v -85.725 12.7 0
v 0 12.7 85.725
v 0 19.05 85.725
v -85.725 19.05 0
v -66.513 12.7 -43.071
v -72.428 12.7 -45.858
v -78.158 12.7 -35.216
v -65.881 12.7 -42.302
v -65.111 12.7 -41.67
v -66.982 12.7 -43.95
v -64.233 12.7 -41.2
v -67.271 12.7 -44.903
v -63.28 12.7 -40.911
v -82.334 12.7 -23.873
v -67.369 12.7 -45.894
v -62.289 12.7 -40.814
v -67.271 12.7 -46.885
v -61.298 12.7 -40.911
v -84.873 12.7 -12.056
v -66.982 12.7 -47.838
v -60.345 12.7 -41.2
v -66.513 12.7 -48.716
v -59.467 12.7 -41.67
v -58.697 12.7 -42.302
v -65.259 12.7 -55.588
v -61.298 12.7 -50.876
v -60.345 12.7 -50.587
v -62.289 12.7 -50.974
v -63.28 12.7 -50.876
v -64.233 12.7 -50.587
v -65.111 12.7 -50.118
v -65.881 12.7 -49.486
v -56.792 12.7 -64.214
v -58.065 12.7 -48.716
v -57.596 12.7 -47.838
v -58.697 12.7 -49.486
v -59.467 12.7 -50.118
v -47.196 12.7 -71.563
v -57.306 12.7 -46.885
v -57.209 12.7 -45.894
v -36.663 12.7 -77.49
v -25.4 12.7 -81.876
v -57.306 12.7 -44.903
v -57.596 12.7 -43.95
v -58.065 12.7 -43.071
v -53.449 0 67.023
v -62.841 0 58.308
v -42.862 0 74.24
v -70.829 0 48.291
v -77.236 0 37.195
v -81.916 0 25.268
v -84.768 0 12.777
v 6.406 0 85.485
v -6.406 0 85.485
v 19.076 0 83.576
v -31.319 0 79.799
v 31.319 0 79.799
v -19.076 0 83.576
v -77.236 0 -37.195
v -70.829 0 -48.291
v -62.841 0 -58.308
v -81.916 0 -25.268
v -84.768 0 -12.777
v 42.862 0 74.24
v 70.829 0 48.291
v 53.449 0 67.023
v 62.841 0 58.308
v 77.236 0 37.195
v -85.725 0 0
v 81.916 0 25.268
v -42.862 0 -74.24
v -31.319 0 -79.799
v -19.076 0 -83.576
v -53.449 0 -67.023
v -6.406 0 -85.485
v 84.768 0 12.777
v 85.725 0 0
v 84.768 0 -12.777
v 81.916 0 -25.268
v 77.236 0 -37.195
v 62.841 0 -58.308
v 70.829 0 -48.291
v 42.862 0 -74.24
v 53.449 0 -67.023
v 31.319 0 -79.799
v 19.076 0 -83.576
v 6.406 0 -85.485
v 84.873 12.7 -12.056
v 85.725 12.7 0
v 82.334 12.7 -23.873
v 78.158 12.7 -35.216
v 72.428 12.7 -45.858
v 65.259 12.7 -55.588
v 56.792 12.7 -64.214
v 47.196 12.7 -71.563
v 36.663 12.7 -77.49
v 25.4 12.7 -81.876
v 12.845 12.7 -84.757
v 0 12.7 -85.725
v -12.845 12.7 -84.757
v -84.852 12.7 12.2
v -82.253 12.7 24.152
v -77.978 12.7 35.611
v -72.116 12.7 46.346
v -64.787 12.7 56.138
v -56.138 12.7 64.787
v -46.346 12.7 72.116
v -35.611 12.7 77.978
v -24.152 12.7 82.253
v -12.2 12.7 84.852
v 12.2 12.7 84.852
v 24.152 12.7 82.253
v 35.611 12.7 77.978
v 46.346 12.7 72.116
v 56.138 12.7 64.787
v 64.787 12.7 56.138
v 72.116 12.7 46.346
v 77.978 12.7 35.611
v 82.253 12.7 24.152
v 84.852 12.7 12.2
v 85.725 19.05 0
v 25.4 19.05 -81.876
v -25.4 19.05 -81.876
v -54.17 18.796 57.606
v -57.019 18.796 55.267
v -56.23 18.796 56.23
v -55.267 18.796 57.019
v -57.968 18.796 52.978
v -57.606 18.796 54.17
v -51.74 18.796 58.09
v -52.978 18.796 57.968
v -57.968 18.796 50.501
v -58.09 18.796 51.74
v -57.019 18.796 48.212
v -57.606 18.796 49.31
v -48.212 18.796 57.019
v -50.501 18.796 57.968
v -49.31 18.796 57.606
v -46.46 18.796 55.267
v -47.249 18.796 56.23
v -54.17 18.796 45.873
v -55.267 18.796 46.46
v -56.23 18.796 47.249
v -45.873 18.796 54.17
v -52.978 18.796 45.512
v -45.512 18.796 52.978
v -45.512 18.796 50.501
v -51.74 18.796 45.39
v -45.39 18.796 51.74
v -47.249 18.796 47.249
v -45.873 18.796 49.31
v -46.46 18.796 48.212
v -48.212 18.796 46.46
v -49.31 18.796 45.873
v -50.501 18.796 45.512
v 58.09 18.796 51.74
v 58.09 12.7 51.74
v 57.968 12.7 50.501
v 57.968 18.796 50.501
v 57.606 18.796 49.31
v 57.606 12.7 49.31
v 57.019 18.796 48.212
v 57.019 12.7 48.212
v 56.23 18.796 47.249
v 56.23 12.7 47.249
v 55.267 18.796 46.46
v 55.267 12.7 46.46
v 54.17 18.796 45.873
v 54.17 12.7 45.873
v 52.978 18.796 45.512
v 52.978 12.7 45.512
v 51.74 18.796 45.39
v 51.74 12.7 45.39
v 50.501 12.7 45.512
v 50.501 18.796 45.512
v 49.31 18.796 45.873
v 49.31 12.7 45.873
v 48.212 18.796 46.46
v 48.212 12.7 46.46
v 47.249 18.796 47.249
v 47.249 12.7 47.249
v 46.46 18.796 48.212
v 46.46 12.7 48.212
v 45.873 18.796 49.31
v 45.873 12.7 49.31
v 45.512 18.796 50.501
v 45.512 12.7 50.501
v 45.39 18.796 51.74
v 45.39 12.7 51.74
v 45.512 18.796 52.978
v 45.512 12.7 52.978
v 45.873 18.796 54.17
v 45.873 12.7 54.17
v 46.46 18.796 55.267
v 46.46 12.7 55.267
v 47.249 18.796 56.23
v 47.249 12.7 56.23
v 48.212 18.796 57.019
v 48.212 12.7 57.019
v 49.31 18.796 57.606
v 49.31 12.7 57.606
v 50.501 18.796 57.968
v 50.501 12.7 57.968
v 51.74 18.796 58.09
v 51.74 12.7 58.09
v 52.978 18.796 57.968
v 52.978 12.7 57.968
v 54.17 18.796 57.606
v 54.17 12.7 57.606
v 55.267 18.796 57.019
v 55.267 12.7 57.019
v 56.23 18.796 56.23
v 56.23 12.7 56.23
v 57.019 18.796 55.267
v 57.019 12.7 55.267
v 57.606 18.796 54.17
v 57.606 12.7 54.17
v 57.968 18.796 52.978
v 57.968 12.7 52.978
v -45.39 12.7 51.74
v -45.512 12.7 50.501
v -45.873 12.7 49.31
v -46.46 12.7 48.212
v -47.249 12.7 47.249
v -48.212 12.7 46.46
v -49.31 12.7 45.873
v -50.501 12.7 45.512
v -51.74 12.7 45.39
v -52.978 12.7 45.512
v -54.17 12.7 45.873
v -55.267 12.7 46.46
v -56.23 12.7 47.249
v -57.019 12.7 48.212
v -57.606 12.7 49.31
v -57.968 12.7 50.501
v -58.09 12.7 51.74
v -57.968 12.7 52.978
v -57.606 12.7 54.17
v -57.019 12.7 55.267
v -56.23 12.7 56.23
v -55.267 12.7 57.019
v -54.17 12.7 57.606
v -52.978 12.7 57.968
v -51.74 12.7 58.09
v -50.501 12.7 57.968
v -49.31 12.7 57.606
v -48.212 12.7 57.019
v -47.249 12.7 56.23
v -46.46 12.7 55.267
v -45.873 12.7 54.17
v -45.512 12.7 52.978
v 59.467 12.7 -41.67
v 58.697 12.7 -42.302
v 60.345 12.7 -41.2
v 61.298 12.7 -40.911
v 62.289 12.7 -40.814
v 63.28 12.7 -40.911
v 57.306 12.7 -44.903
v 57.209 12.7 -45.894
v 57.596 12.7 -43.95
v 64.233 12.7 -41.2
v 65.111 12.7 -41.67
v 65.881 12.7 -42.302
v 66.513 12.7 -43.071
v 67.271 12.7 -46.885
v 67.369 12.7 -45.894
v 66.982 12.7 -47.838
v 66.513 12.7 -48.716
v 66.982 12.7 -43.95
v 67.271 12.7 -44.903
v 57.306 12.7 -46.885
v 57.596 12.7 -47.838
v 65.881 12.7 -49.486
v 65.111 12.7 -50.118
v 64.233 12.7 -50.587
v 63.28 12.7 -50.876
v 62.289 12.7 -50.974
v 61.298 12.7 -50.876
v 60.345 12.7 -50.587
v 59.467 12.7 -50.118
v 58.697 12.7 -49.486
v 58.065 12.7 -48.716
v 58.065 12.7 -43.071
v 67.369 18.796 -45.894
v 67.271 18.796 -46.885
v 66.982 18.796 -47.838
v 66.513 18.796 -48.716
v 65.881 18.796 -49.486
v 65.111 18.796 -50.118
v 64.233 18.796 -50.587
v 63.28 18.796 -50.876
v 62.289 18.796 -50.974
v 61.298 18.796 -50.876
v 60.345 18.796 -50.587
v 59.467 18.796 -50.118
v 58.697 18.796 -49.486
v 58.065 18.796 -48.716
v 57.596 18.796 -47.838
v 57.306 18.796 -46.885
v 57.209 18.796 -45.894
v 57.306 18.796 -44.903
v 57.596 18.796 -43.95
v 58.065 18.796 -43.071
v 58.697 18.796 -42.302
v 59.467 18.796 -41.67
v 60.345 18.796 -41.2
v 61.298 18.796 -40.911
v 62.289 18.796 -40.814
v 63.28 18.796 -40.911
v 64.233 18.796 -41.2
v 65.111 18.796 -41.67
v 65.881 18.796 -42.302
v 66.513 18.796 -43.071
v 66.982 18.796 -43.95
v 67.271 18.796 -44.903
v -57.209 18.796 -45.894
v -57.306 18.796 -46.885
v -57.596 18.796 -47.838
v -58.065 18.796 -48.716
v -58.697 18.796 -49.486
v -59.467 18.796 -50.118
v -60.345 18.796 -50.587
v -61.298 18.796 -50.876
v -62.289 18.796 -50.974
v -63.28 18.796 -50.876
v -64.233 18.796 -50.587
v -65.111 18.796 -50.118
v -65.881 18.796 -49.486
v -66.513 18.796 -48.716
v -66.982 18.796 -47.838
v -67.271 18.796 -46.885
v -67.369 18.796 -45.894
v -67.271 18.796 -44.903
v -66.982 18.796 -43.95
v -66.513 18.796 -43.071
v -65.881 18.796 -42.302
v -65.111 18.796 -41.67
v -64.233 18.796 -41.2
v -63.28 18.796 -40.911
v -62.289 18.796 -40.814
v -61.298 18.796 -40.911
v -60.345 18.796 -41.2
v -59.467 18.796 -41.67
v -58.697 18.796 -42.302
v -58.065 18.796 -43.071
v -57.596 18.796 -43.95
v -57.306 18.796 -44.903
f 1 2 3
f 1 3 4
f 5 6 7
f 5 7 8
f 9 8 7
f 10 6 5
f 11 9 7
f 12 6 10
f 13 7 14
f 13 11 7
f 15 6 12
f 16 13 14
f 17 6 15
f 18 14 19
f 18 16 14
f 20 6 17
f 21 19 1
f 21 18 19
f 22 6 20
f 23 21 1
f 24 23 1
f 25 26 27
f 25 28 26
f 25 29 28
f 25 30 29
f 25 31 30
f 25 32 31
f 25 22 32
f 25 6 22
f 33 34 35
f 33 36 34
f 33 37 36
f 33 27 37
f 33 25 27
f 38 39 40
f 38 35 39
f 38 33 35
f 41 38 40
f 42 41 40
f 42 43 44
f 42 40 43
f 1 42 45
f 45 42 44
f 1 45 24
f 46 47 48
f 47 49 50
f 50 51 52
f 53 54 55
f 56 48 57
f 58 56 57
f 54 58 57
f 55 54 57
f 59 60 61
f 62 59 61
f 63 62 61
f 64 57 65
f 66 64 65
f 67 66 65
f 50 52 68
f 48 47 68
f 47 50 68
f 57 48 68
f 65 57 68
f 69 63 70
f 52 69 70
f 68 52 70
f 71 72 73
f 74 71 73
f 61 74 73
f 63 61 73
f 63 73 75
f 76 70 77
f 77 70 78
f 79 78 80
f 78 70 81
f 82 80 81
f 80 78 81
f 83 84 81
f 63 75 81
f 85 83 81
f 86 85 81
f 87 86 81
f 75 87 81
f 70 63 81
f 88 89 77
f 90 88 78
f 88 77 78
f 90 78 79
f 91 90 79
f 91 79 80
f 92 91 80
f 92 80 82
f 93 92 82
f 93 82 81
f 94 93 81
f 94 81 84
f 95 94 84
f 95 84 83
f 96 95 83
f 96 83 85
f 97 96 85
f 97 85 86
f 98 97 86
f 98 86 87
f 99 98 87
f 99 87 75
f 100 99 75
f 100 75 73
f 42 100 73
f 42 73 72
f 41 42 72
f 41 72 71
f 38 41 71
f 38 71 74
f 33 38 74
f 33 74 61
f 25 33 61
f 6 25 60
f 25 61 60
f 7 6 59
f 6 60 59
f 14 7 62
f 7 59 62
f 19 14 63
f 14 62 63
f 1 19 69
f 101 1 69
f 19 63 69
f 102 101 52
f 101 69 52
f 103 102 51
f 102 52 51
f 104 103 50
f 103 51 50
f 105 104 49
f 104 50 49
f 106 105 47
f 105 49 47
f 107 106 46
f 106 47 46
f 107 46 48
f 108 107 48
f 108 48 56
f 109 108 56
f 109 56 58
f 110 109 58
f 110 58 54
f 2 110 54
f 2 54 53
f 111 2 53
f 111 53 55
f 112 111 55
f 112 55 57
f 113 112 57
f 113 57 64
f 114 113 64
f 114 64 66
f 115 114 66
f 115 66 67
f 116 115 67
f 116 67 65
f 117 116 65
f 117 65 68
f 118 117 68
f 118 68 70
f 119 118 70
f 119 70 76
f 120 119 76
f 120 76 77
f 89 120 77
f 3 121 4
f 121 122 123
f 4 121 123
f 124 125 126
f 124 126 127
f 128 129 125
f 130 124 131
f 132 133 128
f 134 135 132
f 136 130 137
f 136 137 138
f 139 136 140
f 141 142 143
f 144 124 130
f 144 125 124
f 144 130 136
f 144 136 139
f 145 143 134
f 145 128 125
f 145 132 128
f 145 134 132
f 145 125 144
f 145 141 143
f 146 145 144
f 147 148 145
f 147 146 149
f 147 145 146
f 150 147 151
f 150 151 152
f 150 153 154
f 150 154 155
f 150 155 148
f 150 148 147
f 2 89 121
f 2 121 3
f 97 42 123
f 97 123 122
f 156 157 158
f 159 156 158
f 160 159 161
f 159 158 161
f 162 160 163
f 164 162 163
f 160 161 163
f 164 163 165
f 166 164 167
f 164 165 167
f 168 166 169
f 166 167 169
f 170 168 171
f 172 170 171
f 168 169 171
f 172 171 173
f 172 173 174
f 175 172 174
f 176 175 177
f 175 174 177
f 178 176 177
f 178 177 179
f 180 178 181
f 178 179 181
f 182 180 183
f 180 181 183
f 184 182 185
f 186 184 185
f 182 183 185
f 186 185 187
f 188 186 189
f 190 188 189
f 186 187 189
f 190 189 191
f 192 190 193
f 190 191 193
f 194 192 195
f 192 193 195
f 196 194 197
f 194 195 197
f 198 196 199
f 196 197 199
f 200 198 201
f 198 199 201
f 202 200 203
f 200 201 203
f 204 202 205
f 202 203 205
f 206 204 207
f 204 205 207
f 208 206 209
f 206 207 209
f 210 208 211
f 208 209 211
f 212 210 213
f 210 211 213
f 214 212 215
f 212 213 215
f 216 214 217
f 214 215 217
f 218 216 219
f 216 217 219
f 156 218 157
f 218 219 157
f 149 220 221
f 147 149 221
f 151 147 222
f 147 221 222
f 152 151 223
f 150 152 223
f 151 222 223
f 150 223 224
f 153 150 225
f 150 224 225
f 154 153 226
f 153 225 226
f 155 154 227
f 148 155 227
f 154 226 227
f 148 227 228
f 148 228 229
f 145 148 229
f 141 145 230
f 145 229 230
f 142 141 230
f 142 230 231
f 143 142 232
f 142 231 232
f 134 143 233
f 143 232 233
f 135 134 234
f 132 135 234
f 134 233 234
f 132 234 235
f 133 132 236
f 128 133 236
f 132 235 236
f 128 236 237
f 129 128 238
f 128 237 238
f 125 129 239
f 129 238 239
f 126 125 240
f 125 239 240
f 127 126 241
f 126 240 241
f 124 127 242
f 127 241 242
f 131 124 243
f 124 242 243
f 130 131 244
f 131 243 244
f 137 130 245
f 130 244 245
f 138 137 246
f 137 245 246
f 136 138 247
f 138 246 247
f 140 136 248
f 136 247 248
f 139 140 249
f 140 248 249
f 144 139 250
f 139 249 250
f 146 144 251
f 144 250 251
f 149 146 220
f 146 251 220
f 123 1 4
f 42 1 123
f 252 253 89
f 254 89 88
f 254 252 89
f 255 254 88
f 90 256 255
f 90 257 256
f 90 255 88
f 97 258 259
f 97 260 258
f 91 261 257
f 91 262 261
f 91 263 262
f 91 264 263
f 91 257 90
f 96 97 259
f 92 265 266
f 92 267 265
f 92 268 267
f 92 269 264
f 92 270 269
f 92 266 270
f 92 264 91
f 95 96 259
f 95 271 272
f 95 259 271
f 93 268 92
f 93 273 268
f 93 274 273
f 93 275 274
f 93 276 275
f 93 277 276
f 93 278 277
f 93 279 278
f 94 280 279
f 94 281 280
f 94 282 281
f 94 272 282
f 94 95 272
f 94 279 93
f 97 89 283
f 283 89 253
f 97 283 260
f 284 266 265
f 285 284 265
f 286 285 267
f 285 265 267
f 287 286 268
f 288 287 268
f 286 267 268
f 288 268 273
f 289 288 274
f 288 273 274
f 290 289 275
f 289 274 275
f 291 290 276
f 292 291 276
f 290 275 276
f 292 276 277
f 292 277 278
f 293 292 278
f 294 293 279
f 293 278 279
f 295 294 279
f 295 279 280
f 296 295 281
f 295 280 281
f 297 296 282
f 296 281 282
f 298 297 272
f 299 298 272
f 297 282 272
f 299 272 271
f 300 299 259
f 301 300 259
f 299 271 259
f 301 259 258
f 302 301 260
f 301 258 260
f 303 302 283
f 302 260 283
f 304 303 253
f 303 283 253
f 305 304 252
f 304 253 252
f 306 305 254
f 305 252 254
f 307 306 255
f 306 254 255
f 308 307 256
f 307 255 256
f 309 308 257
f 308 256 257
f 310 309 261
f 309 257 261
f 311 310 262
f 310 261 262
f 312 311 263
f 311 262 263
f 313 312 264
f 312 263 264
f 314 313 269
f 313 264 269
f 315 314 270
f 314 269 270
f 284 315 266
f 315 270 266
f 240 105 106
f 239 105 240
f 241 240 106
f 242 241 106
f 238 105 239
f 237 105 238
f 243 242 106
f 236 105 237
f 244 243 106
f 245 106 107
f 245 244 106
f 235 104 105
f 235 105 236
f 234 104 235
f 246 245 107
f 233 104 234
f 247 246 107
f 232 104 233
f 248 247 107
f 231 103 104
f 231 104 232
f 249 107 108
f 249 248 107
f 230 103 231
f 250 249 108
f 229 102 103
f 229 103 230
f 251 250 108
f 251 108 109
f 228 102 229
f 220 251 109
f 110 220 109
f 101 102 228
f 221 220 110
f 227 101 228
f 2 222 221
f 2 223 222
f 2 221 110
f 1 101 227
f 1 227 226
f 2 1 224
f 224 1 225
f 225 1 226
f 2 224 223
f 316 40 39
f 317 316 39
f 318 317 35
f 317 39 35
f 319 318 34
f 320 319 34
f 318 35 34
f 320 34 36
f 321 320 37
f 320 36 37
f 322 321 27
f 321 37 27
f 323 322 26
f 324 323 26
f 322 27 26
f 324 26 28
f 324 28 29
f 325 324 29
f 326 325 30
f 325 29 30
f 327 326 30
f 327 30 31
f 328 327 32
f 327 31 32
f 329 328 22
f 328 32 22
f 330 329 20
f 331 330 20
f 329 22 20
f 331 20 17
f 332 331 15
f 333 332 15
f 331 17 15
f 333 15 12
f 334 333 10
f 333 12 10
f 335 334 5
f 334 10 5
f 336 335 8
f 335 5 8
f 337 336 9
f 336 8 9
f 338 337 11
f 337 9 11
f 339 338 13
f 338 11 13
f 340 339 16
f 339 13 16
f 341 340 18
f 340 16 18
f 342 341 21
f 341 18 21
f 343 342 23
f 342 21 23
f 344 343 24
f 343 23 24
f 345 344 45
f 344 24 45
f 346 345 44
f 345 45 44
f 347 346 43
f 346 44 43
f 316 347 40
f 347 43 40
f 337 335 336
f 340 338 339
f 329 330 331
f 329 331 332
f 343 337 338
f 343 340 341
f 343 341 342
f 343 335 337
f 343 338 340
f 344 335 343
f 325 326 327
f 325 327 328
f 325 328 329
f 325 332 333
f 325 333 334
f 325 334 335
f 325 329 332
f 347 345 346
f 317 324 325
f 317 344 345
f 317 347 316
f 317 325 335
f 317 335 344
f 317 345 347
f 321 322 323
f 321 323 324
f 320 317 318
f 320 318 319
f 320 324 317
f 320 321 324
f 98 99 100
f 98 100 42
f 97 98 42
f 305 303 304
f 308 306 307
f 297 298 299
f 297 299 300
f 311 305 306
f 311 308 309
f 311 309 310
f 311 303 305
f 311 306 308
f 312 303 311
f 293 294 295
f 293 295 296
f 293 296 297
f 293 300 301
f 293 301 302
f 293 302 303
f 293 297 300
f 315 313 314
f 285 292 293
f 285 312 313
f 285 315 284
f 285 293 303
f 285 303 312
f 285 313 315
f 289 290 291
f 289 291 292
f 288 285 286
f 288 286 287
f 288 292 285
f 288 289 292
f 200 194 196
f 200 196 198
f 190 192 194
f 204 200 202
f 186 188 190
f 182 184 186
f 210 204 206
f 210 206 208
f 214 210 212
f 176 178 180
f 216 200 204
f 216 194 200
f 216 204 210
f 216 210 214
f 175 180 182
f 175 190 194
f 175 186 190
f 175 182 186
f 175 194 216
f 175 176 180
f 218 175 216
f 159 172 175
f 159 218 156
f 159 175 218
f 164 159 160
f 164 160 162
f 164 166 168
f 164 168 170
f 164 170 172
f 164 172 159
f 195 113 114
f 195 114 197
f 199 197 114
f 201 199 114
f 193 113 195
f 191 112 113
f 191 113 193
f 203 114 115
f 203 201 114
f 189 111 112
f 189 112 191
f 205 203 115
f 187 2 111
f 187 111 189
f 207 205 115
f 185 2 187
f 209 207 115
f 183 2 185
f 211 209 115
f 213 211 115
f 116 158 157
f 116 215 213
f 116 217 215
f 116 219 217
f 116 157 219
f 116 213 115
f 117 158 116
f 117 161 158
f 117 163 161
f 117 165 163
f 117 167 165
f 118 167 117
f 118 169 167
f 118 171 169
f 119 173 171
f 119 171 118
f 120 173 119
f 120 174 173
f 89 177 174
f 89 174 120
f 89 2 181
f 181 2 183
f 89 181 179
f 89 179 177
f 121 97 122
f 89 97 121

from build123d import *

# Parameters (mm, degrees)
SKETCH1_R           = 85.725
BOSS_EXTRUDE1_DEPTH = 12.7
BOSS_EXTRUDE2_DEPTH = 6.35
SKETCH3_R           = 6.35
SKETCH3_R_2         = 5.08
BOSS_EXTRUDE3_DEPTH = 6.096


with BuildPart() as part:
    # Sketch1 → Boss-Extrude1 (new body)
    with BuildSketch(Plane(origin=(0, 0, 0), x_dir=(1, 0, 0), z_dir=(0, 1, 0))):
        Circle(SKETCH1_R)
    extrude(amount=BOSS_EXTRUDE1_DEPTH)

    # Sketch2 → Boss-Extrude2 (add)
    with BuildSketch(Plane(origin=(0, 12.7, 0), x_dir=(1, 0, 0), z_dir=(0, 1, 0))):
        Polygon((-25.4, 81.875610685), (25.4, 81.875610685), (85.725, 0), (0, -85.725), (-85.725, 0), align=None)
    extrude(amount=BOSS_EXTRUDE2_DEPTH)

    # Sketch3 → Boss-Extrude3 (add)
    with BuildSketch(Plane(origin=(0, 12.7, 0), x_dir=(1, 0, 0), z_dir=(0, 1, 0))):
        with Locations((-51.739614409, -51.739614409)):
            Circle(SKETCH3_R)
        with Locations((51.739614409, -51.739614409)):
            Circle(SKETCH3_R)
        with Locations((62.288840877, 45.893695259)):
            Circle(SKETCH3_R_2)
        with Locations((-62.288840877, 45.893695259)):
            Circle(SKETCH3_R_2)
    extrude(amount=BOSS_EXTRUDE3_DEPTH)


solid = part.part
